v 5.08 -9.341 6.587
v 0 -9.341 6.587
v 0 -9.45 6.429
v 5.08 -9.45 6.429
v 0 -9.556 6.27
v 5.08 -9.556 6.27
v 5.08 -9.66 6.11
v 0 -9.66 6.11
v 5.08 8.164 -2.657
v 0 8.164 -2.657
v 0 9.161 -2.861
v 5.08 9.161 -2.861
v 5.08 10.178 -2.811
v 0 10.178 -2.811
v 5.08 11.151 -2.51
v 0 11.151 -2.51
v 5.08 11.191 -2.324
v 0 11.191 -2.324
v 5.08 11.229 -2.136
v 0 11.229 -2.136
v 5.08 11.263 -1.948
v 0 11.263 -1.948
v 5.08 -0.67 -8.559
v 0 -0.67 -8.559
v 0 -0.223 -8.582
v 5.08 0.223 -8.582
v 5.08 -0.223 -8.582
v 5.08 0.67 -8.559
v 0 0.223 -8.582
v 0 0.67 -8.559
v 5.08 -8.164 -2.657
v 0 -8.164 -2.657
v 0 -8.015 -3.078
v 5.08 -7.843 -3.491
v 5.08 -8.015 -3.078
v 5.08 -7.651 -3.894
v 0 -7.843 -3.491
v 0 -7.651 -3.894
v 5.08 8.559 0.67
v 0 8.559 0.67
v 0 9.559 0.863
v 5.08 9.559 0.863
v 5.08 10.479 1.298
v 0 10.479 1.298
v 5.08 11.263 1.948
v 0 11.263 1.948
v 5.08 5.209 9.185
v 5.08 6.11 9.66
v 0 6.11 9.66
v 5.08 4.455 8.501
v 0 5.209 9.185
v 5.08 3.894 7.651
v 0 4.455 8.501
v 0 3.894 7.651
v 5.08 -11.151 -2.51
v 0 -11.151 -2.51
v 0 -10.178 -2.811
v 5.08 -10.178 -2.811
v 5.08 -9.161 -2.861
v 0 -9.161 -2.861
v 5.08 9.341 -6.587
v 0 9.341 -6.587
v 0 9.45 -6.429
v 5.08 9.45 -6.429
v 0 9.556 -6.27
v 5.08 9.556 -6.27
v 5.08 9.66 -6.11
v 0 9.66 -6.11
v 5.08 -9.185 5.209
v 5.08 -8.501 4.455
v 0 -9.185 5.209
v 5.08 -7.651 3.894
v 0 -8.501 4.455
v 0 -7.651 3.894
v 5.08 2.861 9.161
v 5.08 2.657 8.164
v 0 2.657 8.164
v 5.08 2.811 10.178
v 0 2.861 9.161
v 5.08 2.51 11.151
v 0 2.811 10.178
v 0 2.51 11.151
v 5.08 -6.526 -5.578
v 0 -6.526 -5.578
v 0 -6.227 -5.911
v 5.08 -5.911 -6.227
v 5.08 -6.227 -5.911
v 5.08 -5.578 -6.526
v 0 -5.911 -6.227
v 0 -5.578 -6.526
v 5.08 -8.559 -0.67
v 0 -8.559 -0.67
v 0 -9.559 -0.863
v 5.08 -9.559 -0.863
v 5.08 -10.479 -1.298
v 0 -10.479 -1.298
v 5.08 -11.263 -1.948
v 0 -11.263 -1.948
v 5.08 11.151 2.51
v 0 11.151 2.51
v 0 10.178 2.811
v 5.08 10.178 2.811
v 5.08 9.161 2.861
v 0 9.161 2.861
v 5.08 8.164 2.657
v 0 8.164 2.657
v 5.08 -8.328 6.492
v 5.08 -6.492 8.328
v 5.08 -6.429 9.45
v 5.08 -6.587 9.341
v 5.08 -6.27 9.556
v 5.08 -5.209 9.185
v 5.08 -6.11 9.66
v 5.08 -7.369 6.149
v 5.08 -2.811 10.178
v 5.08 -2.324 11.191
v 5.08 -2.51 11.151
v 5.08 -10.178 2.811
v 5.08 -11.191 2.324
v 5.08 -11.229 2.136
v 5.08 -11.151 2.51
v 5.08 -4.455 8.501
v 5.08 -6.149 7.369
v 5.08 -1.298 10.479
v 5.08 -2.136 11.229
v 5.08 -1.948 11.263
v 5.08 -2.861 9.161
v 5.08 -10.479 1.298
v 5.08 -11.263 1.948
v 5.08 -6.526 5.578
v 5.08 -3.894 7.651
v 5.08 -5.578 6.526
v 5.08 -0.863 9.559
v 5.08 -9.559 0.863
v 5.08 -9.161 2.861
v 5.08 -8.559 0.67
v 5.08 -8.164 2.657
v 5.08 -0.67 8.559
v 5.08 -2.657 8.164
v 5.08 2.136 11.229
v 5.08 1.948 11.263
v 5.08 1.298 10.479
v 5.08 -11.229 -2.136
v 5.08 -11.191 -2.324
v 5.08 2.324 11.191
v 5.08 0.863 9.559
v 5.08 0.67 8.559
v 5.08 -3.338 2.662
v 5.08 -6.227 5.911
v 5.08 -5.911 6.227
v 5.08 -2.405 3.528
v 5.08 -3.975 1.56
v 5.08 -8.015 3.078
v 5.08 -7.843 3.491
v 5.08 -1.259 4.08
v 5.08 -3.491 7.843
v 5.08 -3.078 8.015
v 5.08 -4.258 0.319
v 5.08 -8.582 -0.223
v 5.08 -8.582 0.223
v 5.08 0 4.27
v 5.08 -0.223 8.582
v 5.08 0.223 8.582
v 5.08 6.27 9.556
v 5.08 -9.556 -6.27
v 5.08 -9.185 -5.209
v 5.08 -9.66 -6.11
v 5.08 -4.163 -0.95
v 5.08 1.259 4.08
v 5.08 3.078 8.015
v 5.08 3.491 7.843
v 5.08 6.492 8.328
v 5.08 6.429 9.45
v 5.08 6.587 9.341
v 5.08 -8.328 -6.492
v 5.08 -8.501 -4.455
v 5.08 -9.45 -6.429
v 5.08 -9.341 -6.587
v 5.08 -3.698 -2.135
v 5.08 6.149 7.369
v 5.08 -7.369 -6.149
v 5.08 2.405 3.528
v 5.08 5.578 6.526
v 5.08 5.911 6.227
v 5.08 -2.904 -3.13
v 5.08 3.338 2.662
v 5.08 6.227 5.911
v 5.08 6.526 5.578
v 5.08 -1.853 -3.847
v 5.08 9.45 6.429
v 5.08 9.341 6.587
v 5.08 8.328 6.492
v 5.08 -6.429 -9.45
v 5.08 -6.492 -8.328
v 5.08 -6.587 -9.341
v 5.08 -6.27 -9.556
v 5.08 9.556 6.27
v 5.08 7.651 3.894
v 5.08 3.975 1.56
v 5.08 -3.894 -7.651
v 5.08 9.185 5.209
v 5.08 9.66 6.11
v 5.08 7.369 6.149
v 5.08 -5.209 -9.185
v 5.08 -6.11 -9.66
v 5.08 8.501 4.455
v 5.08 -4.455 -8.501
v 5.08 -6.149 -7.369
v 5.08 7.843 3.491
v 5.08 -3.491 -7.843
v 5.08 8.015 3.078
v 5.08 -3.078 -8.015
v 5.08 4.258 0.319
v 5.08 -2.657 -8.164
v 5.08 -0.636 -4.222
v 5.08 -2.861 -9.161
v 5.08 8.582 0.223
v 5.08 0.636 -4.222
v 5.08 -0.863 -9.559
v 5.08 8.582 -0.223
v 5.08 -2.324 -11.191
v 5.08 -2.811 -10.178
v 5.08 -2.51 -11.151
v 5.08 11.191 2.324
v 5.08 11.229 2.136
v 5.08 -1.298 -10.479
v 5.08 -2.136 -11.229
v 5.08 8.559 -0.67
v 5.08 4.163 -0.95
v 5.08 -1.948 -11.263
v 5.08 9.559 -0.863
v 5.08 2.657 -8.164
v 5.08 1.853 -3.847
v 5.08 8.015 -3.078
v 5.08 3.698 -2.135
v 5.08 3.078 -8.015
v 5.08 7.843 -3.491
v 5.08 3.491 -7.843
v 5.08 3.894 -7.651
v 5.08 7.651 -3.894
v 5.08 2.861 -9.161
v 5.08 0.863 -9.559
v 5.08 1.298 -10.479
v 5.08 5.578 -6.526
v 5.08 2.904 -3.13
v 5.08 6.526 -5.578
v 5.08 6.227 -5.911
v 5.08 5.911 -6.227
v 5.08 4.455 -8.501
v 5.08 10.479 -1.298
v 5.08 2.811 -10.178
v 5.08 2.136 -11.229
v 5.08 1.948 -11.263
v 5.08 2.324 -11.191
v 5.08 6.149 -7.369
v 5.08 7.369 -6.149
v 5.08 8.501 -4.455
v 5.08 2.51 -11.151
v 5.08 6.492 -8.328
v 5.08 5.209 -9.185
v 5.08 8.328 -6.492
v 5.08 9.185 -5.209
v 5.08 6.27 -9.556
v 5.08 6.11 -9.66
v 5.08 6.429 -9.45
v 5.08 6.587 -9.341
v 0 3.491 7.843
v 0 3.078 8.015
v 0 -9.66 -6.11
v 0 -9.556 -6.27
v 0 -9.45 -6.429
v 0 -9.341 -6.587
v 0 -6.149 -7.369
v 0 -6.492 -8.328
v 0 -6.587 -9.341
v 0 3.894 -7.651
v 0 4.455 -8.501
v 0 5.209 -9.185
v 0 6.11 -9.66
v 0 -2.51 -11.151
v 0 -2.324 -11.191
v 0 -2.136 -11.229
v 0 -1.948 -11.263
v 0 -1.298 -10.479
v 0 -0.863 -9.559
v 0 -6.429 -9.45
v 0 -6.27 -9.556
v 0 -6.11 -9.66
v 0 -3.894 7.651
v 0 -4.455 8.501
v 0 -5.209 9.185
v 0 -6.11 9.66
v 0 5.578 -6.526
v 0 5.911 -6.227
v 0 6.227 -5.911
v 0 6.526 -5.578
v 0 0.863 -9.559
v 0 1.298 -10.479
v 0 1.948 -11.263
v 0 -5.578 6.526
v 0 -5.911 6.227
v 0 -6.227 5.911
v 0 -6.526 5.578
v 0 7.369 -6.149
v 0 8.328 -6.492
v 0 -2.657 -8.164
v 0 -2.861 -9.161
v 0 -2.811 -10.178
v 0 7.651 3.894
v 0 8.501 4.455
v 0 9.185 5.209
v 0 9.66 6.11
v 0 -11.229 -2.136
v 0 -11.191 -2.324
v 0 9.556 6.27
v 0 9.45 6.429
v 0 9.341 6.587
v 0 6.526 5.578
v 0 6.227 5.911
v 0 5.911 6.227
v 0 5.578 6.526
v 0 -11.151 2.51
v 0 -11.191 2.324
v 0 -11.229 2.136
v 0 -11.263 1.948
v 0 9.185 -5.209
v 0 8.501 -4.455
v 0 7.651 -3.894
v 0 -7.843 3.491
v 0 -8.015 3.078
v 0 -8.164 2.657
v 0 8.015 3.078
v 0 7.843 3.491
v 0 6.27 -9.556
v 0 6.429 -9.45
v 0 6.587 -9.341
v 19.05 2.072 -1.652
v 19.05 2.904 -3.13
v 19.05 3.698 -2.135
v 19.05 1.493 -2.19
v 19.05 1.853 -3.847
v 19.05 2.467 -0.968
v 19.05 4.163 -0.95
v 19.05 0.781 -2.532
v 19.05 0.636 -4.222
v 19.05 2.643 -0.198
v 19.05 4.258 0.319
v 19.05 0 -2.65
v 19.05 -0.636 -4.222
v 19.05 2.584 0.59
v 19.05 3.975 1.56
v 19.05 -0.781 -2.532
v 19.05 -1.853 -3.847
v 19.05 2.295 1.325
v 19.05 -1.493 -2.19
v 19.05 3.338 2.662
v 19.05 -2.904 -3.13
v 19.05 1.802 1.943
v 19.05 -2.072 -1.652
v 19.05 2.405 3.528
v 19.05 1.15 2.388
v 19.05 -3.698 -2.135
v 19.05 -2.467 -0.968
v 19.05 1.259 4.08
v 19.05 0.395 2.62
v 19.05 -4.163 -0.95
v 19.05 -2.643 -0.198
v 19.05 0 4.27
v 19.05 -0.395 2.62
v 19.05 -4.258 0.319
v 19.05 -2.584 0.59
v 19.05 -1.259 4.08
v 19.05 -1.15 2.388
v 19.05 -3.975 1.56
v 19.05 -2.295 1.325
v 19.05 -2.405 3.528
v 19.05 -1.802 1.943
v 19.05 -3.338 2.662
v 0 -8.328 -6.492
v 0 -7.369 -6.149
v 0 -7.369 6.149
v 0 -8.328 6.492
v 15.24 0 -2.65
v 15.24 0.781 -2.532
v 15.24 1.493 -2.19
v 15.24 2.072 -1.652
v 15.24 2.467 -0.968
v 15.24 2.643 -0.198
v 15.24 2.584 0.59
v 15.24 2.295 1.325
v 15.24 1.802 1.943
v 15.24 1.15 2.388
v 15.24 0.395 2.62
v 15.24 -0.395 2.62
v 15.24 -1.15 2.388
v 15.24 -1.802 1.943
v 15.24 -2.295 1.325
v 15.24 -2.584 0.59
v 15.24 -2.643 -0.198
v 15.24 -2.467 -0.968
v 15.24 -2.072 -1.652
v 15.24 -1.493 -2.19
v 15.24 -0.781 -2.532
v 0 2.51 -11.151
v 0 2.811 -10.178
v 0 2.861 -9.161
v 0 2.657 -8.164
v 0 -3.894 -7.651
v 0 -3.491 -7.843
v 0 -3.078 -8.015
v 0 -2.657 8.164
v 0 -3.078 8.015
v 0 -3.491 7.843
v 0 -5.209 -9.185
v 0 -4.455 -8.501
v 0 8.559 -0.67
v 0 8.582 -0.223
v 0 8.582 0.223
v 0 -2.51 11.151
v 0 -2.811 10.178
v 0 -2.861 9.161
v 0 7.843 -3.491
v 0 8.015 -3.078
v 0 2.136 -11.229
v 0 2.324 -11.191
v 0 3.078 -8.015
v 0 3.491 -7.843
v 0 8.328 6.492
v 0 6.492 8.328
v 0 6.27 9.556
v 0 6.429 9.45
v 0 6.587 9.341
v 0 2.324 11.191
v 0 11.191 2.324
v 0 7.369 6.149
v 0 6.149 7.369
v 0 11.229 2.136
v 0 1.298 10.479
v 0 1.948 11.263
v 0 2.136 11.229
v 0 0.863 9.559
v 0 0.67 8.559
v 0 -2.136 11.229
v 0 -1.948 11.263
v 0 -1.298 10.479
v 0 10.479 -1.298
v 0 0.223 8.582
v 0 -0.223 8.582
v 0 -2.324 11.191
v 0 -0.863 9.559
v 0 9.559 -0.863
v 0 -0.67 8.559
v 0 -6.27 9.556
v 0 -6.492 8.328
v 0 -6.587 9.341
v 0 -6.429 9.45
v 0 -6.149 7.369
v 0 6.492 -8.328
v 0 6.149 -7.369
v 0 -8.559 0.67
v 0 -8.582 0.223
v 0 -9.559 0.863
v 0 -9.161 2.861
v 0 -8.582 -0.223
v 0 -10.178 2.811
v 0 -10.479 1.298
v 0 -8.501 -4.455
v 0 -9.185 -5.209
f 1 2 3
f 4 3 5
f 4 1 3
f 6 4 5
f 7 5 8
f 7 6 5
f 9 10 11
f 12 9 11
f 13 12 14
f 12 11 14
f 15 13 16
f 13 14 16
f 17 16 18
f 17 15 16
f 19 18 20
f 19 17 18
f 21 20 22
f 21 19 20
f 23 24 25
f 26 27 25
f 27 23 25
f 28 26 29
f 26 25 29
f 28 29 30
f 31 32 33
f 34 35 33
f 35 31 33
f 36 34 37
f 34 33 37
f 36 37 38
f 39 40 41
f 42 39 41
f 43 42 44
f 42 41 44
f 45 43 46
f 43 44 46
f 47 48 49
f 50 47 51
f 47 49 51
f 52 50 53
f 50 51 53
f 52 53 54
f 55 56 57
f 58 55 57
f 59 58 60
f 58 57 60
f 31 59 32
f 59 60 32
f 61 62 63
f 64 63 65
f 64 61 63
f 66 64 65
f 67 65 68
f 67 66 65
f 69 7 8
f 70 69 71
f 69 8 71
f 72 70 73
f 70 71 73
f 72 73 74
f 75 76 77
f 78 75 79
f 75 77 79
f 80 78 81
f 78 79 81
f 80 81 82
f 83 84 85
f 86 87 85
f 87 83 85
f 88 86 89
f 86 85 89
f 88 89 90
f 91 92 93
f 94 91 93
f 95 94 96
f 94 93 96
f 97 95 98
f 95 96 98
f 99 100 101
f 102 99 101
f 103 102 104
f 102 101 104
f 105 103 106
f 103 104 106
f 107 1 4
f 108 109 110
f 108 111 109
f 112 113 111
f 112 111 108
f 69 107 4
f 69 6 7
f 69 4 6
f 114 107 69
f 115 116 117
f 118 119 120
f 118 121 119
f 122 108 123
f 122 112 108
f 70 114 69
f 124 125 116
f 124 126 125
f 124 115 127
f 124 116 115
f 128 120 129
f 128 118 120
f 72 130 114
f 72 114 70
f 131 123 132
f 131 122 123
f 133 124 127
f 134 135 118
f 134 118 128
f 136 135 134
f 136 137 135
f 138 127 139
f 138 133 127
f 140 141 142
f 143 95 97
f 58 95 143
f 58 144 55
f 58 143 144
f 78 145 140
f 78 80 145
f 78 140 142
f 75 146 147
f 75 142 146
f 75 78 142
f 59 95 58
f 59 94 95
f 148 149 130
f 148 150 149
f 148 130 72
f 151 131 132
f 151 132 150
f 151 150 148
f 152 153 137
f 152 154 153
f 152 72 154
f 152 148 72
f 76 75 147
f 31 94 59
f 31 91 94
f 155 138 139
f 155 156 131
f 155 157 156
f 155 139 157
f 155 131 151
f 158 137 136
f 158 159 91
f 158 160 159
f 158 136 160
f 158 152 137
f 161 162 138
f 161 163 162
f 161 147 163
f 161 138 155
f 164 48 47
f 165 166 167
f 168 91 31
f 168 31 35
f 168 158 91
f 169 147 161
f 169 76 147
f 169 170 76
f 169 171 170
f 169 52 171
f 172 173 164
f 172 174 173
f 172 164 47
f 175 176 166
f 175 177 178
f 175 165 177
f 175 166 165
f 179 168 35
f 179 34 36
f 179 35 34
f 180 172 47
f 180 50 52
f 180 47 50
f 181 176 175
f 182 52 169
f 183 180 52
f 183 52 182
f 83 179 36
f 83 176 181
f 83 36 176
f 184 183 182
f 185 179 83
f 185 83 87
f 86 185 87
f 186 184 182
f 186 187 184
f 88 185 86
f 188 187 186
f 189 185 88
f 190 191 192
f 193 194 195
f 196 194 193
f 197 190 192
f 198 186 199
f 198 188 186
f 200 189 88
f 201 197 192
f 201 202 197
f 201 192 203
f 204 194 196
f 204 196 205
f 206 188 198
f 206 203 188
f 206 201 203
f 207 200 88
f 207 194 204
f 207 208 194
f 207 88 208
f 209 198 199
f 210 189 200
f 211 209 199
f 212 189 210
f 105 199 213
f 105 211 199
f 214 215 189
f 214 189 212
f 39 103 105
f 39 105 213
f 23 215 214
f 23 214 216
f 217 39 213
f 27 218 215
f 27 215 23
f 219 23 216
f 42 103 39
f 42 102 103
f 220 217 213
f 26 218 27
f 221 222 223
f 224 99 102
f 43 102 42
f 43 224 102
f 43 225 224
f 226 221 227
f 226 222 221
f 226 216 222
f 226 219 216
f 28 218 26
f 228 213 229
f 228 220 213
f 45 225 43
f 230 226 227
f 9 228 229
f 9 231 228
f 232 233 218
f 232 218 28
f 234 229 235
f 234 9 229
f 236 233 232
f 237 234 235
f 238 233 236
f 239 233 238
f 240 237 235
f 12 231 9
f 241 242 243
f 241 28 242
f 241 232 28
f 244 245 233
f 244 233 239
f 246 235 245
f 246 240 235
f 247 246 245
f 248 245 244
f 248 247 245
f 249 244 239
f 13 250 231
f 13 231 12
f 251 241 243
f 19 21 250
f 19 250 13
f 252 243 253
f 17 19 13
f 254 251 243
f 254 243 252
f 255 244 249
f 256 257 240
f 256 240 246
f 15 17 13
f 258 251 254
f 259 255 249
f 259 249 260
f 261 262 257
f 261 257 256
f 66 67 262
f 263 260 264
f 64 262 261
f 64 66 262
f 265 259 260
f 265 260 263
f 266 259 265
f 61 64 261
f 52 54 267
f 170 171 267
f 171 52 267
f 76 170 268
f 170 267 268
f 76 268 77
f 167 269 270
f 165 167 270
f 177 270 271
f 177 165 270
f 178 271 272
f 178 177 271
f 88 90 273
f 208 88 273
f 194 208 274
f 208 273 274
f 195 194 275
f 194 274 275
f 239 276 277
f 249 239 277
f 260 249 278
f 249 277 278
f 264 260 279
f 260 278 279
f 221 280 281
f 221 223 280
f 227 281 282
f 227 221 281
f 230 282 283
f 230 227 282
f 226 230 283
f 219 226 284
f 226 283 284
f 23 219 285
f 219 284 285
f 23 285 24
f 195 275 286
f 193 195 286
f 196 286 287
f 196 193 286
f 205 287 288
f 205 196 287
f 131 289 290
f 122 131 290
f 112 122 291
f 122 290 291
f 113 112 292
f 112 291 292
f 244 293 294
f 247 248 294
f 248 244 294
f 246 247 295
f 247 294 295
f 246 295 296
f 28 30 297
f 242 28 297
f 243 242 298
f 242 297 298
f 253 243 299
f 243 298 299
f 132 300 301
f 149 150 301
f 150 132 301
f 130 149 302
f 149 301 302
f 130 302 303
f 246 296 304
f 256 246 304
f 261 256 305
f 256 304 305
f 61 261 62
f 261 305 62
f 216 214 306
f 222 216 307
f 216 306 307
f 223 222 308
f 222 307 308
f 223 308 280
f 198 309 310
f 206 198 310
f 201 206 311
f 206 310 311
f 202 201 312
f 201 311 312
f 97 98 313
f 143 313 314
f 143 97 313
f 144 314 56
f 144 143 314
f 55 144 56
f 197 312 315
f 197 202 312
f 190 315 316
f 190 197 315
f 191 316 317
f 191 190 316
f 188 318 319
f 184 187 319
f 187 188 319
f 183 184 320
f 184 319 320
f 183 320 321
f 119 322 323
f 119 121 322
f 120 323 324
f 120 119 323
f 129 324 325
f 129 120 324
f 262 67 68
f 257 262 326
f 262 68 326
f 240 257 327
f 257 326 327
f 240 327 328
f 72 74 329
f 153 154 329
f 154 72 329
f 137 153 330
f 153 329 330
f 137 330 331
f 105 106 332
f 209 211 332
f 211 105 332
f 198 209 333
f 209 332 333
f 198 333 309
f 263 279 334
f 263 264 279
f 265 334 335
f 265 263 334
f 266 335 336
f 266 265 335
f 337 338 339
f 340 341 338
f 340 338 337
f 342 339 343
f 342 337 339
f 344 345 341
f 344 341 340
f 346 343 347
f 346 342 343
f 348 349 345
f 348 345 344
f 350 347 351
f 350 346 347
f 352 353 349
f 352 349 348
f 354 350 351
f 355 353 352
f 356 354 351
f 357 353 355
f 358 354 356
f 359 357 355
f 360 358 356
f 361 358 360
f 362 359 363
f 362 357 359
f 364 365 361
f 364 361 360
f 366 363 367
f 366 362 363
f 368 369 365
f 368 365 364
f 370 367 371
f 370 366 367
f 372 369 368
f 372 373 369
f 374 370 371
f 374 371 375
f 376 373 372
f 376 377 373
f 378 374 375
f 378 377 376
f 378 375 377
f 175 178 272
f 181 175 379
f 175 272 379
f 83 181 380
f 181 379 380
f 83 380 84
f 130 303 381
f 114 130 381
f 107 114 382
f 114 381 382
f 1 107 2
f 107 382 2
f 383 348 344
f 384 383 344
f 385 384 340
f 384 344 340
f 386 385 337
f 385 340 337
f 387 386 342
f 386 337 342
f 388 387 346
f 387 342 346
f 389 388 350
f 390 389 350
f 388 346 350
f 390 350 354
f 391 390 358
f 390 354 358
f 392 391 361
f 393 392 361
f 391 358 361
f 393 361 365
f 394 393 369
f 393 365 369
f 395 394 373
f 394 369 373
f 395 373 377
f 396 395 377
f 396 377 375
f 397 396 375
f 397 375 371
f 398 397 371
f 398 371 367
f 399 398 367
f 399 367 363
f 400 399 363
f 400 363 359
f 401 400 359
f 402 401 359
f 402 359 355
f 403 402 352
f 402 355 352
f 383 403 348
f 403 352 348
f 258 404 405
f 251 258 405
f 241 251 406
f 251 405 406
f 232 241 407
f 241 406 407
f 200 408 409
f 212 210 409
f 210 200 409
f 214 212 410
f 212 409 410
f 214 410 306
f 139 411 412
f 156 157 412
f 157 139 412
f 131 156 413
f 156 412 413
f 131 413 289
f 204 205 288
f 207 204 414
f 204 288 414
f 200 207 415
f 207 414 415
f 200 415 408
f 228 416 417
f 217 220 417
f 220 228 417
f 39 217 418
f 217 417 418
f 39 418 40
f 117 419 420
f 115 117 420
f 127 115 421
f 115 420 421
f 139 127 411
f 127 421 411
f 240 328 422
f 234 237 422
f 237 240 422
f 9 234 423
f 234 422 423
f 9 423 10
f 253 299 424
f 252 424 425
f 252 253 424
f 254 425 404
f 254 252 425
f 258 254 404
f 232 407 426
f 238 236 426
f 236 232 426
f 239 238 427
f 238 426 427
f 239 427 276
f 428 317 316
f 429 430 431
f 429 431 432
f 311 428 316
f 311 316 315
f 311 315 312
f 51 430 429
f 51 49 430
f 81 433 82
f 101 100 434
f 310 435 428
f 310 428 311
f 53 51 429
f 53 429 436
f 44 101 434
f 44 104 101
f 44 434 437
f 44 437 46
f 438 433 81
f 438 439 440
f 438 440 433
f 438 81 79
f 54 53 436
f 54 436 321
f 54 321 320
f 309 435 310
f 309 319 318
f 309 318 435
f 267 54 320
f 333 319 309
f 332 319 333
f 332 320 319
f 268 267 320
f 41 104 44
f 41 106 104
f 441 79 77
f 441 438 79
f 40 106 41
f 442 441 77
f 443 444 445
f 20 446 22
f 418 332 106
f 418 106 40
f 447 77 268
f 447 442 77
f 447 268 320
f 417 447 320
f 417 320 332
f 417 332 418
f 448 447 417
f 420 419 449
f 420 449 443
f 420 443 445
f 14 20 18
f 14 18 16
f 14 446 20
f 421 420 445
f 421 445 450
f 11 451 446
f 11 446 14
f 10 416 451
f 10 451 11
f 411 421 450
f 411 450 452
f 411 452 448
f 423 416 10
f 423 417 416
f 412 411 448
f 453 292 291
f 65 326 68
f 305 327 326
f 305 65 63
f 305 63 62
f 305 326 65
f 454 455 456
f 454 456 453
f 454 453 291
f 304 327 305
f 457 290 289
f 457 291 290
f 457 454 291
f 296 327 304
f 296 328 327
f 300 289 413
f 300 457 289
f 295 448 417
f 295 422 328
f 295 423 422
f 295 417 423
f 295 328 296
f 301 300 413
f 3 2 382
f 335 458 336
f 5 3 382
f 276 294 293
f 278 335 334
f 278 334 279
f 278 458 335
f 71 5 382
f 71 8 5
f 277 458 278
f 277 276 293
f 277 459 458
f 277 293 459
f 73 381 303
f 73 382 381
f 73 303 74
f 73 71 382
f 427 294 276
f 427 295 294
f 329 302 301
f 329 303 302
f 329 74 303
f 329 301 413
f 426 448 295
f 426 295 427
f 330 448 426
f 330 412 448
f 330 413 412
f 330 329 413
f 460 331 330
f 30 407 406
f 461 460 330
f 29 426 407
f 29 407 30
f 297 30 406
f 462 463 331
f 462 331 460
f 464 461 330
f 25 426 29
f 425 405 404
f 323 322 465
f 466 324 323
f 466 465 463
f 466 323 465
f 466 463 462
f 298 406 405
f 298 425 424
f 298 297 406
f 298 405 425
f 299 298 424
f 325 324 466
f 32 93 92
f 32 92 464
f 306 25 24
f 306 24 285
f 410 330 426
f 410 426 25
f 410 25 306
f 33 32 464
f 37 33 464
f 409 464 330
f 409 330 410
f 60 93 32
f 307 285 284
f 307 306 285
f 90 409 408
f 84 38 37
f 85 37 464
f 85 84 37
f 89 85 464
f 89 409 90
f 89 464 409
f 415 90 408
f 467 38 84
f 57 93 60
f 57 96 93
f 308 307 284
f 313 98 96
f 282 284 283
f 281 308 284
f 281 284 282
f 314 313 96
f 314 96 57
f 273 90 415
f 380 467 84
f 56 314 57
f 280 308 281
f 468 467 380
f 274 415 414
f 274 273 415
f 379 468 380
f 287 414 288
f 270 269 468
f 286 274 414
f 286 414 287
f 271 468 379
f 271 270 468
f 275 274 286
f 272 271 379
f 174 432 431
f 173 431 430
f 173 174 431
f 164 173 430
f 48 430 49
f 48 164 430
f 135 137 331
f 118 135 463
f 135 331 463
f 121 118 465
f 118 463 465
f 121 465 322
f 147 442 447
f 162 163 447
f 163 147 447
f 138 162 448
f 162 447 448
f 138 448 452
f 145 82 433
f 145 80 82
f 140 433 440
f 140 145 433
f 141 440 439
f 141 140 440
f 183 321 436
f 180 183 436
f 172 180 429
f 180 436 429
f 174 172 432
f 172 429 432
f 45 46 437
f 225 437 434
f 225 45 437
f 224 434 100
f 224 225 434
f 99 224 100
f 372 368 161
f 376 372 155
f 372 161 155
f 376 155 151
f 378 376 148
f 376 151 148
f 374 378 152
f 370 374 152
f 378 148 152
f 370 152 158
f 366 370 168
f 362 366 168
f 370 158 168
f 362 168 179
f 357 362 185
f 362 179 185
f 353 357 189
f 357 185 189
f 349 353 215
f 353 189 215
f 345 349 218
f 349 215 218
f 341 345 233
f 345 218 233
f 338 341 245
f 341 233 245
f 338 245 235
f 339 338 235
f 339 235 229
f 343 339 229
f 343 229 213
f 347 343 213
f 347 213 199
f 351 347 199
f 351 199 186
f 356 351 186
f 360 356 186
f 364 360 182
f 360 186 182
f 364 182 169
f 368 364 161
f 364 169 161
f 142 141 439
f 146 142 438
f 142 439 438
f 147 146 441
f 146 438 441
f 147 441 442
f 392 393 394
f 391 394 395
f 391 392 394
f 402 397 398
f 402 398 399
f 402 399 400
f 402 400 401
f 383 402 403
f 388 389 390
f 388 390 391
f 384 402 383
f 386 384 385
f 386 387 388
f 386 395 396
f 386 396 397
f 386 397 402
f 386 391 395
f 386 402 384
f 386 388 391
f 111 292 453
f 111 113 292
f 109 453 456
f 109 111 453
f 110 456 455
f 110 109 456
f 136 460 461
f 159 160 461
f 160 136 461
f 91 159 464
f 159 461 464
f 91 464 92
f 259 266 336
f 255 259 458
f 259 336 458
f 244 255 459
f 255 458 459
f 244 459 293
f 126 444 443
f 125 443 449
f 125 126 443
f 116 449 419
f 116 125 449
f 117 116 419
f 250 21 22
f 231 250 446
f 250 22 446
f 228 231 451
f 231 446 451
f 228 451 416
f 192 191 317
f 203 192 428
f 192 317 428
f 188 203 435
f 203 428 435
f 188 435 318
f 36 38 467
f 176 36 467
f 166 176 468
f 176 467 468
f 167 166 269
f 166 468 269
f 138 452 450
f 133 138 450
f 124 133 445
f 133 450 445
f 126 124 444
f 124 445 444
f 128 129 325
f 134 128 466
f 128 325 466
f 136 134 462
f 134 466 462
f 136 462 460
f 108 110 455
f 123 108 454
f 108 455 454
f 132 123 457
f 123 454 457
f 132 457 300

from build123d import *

# Parameters (mm, degrees)
BASPROSKE_W         = 5.08
BASPROSKE_H         = 11.43
TOOTHCUT_DEPTH      = 17.943913361
TEETHCUTS_COUNT     = 16
TEETHCUTS_ANGLE     = 337.5
BORSKE_R            = 0.99949
BORE_DEPTH          = 50.8000508
SKETCH1_R           = 0.99949
BOSS_EXTRUDE1_DEPTH = 5.08
SKETCH2_R           = 4.269999969
BOSS_EXTRUDE2_DEPTH = 13.97
SKETCH3_R           = 2.65
CUT_EXTRUDE1_DEPTH  = 3.81


with BuildPart() as part:
    # BasProSke → Base-Revolve (revolve)
    with BuildSketch(Plane(origin=(0, 0, 0), x_dir=(1, 0, 0), z_dir=(0, 1, 0)), mode=Mode.PRIVATE) as base_revolve_sk:
        with Locations((2.54, 5.715)):
            Rectangle(BASPROSKE_W, BASPROSKE_H)
    revolve(base_revolve_sk.sketch.rotate(Axis((-10, 0, 0), (1, 0, 0)), 180), axis=Axis((-10, 0, 0), (1, 0, 0)))

    # TooCutSke → ToothCut (cut, through all)
    with BuildSketch(Plane(origin=(0, 0, 0), x_dir=(0, 0, -1), z_dir=(1, 0, 0))):
        with BuildLine():
            ThreePointArc((0.669851294, 8.559027882), (0, 8.5852), (-0.669851294, 8.559027882))
            ThreePointArc((-0.669851294, 8.559027882), (-1.058014649, 10.047160022), (-1.971359535, 11.284499579))
            ThreePointArc((-1.971359535, 11.284499579), (0, 11.4554), (1.971359535, 11.284499579))
            ThreePointArc((1.971359535, 11.284499579), (1.058014649, 10.047160022), (0.669851294, 8.559027882))
        make_face()
    toothcut = extrude(amount=TOOTHCUT_DEPTH, mode=Mode.SUBTRACT)

    # TeethCuts: ToothCut ×16 about axis
    teethcuts_axis = Axis((-10, 0, 0), (1, 0, 0))
    for i in range(1, TEETHCUTS_COUNT):
        add(toothcut.rotate(teethcuts_axis, i * TEETHCUTS_ANGLE / (TEETHCUTS_COUNT - 1)), mode=Mode.SUBTRACT)

    # BorSke → Bore (cut, symmetric)
    with BuildSketch(Plane(origin=(0, 0, 0), x_dir=(0, 0, -1), z_dir=(1, 0, 0))):
        with Locations(Location((0, 0, 0), (0, 0, 180))):
            Circle(BORSKE_R)
    extrude(amount=BORE_DEPTH, both=True, mode=Mode.SUBTRACT)

    # Sketch1 → Boss-Extrude1 (add)
    with BuildSketch(Plane(origin=(5.08, 0, 0), x_dir=(0, 0, -1), z_dir=(1, 0, 0))):
        Circle(SKETCH1_R)
    extrude(amount=-BOSS_EXTRUDE1_DEPTH)

    # Sketch2 → Boss-Extrude2 (add)
    with BuildSketch(Plane(origin=(5.08, 0, 0), x_dir=(0, 0, -1), z_dir=(1, 0, 0))):
        with Locations(Location((0, 0, 0), (0, 0, 180))):
            Circle(SKETCH2_R)
    extrude(amount=BOSS_EXTRUDE2_DEPTH)

    # Sketch3 → Cut-Extrude1 (cut)
    with BuildSketch(Plane(origin=(19.05, 0, 0), x_dir=(0, 0, -1), z_dir=(1, 0, 0))):
        Circle(SKETCH3_R)
    extrude(amount=-CUT_EXTRUDE1_DEPTH, mode=Mode.SUBTRACT)


solid = part.part
